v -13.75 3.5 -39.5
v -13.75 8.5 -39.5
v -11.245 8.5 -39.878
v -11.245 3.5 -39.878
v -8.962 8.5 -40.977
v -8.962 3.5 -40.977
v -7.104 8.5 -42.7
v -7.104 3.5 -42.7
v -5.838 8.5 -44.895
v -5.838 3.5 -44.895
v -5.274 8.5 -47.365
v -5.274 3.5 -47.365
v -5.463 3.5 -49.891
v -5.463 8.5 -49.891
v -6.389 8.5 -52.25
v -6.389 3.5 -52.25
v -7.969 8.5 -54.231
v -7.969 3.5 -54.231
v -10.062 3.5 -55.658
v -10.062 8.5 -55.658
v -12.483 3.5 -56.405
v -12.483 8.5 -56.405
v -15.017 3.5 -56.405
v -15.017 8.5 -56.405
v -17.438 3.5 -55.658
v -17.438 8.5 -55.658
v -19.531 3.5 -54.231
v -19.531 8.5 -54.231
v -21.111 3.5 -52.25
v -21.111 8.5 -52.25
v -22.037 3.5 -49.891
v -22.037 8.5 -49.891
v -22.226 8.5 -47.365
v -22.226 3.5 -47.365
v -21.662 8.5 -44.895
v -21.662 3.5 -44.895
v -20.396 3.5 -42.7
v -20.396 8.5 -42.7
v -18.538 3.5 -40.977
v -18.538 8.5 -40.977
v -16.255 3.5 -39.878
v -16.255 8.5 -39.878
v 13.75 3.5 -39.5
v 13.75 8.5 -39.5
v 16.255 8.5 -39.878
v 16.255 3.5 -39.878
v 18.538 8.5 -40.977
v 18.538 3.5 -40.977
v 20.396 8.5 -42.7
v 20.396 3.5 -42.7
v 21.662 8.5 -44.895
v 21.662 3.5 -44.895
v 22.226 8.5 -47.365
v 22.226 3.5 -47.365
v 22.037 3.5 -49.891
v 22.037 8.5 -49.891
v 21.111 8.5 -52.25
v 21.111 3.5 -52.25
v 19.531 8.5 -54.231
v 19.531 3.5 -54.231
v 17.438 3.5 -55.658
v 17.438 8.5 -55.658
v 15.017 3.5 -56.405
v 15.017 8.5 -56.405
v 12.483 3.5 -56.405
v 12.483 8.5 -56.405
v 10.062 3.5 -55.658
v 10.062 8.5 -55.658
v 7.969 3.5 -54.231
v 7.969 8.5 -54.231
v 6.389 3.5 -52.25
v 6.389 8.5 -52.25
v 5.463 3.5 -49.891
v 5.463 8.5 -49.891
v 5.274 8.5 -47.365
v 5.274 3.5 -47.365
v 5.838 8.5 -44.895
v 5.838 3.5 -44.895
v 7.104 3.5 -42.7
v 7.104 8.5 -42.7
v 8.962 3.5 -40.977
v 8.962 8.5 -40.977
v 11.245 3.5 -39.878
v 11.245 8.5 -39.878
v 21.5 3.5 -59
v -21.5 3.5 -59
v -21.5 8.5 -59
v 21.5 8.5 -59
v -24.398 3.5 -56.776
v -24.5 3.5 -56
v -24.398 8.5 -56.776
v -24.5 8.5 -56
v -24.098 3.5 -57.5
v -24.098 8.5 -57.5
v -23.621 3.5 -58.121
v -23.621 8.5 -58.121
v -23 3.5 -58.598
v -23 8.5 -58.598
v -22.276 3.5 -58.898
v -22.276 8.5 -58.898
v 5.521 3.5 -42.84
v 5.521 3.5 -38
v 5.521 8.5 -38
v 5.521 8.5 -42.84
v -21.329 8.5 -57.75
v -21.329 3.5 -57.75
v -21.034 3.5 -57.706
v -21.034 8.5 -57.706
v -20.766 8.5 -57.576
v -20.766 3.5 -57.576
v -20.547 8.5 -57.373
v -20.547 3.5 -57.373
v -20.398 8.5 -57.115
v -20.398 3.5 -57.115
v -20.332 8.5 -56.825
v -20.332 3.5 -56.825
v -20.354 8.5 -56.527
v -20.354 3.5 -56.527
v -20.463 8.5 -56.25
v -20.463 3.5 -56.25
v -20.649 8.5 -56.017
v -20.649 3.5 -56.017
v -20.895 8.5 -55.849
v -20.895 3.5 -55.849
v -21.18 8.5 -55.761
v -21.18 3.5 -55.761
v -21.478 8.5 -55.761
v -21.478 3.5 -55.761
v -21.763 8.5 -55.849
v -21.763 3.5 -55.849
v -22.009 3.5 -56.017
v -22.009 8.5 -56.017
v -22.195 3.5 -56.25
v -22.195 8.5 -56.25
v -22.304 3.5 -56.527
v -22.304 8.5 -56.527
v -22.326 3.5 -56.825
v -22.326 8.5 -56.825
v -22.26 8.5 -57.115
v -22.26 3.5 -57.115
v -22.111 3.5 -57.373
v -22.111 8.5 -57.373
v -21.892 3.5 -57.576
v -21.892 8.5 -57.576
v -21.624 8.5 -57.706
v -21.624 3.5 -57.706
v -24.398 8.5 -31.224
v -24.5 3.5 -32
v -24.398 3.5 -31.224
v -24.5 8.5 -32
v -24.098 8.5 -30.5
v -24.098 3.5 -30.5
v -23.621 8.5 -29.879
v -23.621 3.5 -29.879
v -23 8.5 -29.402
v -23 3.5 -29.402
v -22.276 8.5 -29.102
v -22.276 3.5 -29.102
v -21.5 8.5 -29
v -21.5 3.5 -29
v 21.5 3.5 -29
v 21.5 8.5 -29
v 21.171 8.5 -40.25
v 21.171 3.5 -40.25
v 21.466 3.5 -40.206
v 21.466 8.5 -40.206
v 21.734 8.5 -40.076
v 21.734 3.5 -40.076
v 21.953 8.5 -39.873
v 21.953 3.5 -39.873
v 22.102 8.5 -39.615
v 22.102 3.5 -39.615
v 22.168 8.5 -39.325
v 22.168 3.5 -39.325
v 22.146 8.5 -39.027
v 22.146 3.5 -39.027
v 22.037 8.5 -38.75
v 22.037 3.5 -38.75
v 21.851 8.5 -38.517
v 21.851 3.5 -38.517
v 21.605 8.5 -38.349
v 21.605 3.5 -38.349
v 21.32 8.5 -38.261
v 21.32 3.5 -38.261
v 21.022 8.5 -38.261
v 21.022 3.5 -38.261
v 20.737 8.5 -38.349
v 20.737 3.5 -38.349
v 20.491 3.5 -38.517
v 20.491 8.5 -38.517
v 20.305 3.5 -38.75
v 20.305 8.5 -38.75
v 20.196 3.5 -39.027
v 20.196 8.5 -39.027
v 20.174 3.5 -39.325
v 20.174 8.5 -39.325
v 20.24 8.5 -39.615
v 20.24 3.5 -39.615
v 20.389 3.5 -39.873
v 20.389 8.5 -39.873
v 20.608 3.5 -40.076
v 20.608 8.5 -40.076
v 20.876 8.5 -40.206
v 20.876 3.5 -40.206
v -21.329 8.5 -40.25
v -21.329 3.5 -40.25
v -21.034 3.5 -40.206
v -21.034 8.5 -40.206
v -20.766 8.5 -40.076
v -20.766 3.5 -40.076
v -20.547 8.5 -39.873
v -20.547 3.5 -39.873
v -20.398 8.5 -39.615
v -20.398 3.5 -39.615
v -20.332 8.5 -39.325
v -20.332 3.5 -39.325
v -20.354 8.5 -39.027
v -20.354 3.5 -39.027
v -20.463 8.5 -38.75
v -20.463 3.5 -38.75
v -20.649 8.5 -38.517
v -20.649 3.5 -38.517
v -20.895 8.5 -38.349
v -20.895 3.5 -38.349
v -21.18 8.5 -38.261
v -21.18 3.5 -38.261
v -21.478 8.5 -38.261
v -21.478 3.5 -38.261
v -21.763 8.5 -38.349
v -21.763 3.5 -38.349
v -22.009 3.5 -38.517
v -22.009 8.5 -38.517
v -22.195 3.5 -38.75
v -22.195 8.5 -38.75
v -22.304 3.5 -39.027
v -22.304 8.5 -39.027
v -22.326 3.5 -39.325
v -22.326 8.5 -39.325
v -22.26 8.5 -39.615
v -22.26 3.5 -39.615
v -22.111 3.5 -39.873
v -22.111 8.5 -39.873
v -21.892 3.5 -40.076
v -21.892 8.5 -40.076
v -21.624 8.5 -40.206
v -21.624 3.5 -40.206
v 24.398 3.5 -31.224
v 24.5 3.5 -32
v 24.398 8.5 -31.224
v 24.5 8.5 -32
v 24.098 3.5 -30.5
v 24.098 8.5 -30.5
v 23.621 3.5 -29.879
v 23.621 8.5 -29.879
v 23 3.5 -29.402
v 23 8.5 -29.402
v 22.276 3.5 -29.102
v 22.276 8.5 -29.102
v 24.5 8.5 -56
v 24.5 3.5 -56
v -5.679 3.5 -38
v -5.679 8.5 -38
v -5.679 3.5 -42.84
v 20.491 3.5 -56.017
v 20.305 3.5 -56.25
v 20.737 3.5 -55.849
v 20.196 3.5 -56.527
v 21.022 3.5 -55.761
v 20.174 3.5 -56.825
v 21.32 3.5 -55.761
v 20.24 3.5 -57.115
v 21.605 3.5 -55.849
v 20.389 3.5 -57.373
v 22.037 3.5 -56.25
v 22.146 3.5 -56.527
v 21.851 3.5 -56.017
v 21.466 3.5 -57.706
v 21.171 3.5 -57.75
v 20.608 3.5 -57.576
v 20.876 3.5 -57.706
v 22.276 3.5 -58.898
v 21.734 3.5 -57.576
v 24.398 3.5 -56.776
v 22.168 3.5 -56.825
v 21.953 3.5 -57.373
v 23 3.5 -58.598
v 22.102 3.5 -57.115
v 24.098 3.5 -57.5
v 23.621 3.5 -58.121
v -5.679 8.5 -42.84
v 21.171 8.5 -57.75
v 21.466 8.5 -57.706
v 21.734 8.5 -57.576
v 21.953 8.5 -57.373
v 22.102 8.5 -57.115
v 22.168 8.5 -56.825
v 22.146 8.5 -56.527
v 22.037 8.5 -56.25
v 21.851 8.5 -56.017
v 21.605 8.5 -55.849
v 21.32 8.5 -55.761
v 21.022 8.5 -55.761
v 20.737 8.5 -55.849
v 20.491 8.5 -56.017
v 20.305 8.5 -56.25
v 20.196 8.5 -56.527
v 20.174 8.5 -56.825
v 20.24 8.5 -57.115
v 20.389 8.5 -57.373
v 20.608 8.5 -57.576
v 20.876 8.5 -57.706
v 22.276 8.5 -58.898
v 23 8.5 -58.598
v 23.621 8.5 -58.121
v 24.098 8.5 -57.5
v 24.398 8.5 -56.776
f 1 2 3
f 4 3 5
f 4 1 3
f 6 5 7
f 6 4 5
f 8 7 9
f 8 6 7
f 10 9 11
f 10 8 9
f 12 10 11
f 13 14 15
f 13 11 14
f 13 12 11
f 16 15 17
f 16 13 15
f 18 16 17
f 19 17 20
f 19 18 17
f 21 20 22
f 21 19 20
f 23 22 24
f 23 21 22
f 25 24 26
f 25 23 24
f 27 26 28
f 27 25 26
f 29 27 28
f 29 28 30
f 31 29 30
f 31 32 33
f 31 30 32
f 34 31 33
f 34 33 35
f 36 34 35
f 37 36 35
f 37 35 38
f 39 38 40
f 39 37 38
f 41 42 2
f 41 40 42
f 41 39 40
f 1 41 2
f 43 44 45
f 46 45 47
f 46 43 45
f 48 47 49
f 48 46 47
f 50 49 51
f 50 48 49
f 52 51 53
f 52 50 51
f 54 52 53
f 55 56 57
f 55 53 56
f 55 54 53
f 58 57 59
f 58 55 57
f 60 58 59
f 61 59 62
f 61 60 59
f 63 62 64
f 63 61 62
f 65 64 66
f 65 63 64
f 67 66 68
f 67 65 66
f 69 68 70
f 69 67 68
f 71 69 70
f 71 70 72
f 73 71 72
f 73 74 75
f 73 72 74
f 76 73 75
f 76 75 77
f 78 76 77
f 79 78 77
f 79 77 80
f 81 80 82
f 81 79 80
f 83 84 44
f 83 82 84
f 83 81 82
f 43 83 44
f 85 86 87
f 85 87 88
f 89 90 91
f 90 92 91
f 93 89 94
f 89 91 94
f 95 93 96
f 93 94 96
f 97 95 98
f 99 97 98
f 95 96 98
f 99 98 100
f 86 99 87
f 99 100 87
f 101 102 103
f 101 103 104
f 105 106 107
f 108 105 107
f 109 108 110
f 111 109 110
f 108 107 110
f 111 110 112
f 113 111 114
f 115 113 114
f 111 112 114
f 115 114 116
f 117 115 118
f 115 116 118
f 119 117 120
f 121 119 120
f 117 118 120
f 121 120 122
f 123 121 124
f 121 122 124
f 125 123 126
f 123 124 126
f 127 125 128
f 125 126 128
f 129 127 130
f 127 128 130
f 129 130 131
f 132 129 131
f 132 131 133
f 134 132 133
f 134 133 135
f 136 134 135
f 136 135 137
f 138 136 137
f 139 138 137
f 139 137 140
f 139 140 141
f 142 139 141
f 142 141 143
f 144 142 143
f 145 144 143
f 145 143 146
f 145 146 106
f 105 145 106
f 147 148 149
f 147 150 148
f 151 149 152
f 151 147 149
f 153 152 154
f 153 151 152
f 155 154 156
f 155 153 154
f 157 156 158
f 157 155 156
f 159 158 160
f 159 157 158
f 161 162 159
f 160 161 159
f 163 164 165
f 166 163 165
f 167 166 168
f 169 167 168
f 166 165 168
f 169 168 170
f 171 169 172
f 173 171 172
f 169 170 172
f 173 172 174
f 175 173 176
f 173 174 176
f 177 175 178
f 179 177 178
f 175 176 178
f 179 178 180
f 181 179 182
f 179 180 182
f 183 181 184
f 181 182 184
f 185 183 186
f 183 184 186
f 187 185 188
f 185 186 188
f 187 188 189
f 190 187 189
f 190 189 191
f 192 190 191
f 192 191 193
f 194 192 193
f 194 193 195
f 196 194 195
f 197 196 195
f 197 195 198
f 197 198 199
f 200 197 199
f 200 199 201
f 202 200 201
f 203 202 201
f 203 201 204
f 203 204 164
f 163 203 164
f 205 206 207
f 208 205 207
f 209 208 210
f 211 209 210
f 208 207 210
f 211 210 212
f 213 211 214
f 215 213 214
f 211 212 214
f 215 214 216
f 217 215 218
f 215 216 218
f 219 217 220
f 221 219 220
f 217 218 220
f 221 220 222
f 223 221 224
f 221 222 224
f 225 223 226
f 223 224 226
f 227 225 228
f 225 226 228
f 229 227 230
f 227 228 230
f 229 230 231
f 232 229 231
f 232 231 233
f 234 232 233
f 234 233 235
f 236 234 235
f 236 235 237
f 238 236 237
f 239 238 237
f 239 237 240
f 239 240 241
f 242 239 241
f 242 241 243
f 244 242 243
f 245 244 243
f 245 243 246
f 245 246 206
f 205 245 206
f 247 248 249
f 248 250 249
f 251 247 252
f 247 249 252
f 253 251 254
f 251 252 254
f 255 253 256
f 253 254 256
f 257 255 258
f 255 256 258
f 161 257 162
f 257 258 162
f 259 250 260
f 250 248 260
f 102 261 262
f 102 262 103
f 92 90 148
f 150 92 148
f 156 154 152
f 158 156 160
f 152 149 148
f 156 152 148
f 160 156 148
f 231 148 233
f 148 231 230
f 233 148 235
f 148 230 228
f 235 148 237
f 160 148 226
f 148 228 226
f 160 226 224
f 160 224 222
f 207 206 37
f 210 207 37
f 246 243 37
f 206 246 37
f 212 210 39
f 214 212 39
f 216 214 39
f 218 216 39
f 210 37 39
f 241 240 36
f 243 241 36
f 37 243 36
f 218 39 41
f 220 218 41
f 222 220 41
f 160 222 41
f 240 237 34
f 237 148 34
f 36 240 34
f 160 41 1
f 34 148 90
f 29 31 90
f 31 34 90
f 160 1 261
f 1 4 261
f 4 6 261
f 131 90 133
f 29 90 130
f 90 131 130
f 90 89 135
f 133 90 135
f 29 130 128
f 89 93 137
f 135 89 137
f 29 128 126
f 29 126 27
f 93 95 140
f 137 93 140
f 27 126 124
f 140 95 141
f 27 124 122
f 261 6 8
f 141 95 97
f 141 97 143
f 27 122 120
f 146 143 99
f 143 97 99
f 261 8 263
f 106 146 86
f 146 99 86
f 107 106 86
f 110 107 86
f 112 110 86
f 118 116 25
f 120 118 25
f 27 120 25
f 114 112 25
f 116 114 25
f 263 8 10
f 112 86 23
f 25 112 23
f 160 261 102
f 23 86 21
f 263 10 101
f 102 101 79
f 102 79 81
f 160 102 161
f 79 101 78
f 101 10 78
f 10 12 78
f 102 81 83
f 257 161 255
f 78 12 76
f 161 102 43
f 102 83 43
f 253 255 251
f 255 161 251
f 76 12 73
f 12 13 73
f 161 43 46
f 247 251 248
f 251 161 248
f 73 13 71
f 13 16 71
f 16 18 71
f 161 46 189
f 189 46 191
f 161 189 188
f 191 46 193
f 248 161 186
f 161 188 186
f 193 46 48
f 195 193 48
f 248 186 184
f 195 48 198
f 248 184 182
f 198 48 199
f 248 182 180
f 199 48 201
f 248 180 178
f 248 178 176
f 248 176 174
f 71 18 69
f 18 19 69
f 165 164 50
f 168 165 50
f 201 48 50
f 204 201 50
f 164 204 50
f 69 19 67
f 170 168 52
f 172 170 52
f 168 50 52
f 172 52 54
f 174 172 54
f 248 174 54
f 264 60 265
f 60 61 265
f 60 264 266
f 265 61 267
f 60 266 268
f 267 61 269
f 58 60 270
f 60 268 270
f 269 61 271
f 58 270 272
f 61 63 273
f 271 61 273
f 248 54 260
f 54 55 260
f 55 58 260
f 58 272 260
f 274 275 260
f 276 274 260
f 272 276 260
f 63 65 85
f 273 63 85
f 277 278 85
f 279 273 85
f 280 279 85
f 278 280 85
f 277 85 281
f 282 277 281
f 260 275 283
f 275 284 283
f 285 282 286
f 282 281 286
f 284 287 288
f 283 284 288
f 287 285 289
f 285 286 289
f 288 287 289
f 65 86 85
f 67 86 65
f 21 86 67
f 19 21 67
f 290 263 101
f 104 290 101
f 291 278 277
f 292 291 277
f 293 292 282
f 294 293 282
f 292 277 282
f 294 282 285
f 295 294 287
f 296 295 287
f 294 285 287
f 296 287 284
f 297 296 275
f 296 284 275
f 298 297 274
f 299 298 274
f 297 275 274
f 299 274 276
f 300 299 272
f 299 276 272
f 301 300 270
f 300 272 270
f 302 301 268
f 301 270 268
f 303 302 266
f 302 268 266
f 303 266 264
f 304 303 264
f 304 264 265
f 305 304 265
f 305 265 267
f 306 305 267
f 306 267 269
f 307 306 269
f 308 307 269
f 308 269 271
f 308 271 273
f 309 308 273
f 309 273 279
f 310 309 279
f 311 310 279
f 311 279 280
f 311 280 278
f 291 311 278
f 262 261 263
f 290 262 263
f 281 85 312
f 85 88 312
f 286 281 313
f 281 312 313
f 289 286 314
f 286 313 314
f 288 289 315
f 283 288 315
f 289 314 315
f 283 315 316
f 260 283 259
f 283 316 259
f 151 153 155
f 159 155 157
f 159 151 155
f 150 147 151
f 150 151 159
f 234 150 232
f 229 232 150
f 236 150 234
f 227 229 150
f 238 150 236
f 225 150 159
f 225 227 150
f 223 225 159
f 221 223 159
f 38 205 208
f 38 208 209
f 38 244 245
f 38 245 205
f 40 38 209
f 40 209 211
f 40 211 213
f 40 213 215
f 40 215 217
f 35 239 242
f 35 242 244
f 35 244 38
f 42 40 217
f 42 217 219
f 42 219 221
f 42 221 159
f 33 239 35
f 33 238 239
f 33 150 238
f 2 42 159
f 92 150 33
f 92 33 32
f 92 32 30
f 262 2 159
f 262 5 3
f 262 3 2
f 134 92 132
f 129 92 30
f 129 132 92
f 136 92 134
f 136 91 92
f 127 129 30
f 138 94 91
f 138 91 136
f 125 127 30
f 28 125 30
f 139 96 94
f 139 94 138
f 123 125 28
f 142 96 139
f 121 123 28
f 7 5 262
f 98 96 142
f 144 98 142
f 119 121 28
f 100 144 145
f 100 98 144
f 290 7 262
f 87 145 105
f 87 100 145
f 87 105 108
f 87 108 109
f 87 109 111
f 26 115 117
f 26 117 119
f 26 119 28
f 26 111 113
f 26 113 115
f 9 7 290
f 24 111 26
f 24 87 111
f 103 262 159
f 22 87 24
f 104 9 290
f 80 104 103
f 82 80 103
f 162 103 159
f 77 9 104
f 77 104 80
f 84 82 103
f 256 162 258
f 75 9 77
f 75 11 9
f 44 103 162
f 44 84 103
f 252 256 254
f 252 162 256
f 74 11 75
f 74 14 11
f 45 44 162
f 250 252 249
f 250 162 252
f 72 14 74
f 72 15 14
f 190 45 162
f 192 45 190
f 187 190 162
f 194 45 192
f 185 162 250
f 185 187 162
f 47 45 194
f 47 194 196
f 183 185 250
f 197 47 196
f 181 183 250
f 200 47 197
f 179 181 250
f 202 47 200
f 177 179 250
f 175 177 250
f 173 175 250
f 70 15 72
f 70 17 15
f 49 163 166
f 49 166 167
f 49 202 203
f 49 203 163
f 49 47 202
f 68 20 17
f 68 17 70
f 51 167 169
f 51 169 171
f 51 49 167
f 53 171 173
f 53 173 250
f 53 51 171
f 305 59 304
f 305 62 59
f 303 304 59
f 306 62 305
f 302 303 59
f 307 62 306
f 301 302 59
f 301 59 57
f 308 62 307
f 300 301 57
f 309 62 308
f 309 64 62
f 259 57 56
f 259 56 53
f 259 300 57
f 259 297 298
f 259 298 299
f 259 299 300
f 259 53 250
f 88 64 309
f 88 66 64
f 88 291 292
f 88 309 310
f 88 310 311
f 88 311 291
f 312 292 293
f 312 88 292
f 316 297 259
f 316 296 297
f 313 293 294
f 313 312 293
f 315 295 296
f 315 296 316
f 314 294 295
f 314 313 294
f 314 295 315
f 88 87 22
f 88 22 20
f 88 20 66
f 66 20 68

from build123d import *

# Parameters (mm, degrees)
SKETCH1_R           = 21
SKETCH1_R_2         = 20
BOSS_EXTRUDE1_DEPTH = 3.5
SKETCH2_R           = 3.55
SKETCH2_R_2         = 6.55
SKETCH2_R_3         = 2.55
SKETCH2_R_4         = 8.5
SKETCH2_W           = 11.2
SKETCH2_H           = 4.84
BOSS_EXTRUDE2_DEPTH = 5
SKETCH3_W           = 11.2
SKETCH3_H           = 4.84
SKETCH3_W_2         = 49
SKETCH3_H_2         = 8
SKETCH3_R           = 8.5
IGNORE_DEPTH        = 5
SKETCH4_R           = 8.5
SKETCH4_W           = 11.2
SKETCH4_H           = 4.84
CUT_EXTRUDE2_DEPTH  = 71.901339903
FILLET1_R           = 3
SKETCH5_W           = 42
SKETCH5_H           = 3.5
CUT_EXTRUDE3_DEPTH  = 25
CUT_EXTRUDE5_DEPTH  = 10
FILLET2_R           = 3
SKETCH8_R           = 1
CUT_EXTRUDE6_DEPTH  = 20


with BuildPart() as part:
    # Sketch1 → Boss-Extrude1 (new body)
    with BuildSketch(Plane(origin=(0, 0, 0), x_dir=(1, 0, 0), z_dir=(0, 1, 0))):
        with Locations(Location((0, 0, 0), (0, 0, 90))):
            Circle(SKETCH1_R)
        with Locations(Location((0, 0, 0), (0, 0, 90))):
            Circle(SKETCH1_R_2, mode=Mode.SUBTRACT)
    extrude(amount=BOSS_EXTRUDE1_DEPTH)

    # Sketch2 → Boss-Extrude2 (add)
    with BuildSketch(Plane(origin=(0, 3.5, 0), x_dir=(1, 0, 0), z_dir=(0, 1, 0))):
        Polygon((-29, -5), (-29, -29), (29, -29), (29, -5), (39, -5), (39, 5), (29, 5), (29, 29), (24.5, 29), (24.5, 51), (-24.5, 51), (-24.5, 29), (-29, 29), (-29, 5), (-39, 5), (-39, -5), align=None)
        with Locations(Location((-23.55, -23.55, 0), (0, 0, 270))):
            Circle(SKETCH2_R, mode=Mode.SUBTRACT)
        with Locations(Location((23.55, -23.55, 0), (0, 0, 270))):
            Circle(SKETCH2_R, mode=Mode.SUBTRACT)
        with Locations(Location((0, 0, 0), (0, 0, 270))):
            Circle(SKETCH2_R_2, mode=Mode.SUBTRACT)
        with Locations(Location((-23.55, 23.55, 0), (0, 0, 270))):
            Circle(SKETCH2_R, mode=Mode.SUBTRACT)
        with Locations(Location((23.55, 23.55, 0), (0, 0, 270))):
            Circle(SKETCH2_R, mode=Mode.SUBTRACT)
        with Locations(Location((-34, 0, 0), (0, 0, 270))):
            Circle(SKETCH2_R_3, mode=Mode.SUBTRACT)
        with Locations(Location((34, 0, 0), (0, 0, 270))):
            Circle(SKETCH2_R_3, mode=Mode.SUBTRACT)
        with Locations(Location((13.76, 39, 0), (0, 0, 270))):
            Circle(SKETCH2_R_4, mode=Mode.SUBTRACT)
        with Locations(Location((-13.76, 39, 0), (0, 0, 270))):
            Circle(SKETCH2_R_4, mode=Mode.SUBTRACT)
        with Locations((0, 46.28)):
            Rectangle(SKETCH2_W, SKETCH2_H, mode=Mode.SUBTRACT)
    extrude(amount=BOSS_EXTRUDE2_DEPTH)

    # Sketch3 → Ignore (add)
    with BuildSketch(Plane(origin=(0, 3.5, 0), x_dir=(1, 0, 0), z_dir=(0, 1, 0))):
        with Locations((0, 46.28)):
            Rectangle(SKETCH3_W, SKETCH3_H)
        with Locations((0, 55)):
            Rectangle(SKETCH3_W_2, SKETCH3_H_2)
        with Locations((13.76, 39)):
            Circle(SKETCH3_R)
        with Locations((-13.76, 39)):
            Circle(SKETCH3_R)
    extrude(amount=IGNORE_DEPTH)

    # Sketch4 → Cut-Extrude2 (cut, through all)
    with BuildSketch(Plane(origin=(0, 3.5, 0), x_dir=(1, 0, 0), z_dir=(0, 1, 0))):
        with Locations(Location((-13.75, 48, 0), (0, 0, 270))):
            Circle(SKETCH4_R)
        with Locations(Location((13.75, 48, 0), (0, 0, 270))):
            Circle(SKETCH4_R)
        with Locations((-0.079148889, 40.42)):
            Rectangle(SKETCH4_W, SKETCH4_H)
    extrude(amount=CUT_EXTRUDE2_DEPTH, mode=Mode.SUBTRACT)

    # Fillet1
    fillet1_edges = [part.edges().sort_by_distance(p)[0] for p in [
        (-29, 6, 29),
        (29, 6, 29),
        (39, 6, 5),
        (39, 6, -5),
        (29, 6, -29),
        (-29, 6, -29),
        (-39, 6, -5),
        (-39, 6, 5),
        (24.5, 6, -59),
        (-24.5, 6, -59),
    ]]
    fillet(fillet1_edges, radius=FILLET1_R)

    # Sketch5 → Cut-Extrude3 (cut, symmetric)
    with BuildSketch(Plane.XY):
        with Locations((0, 1.75)):
            Rectangle(SKETCH5_W, SKETCH5_H)
    extrude(amount=CUT_EXTRUDE3_DEPTH, both=True, mode=Mode.SUBTRACT)

    # Sketch6 → Cut-Extrude5 (cut)
    with BuildSketch(Plane(origin=(0, 8.5, 0), x_dir=(1, 0, 0), z_dir=(0, 1, 0))):
        Polygon((-26, 29), (24.5, 29), (43.321910497, 29), (43.321910497, -33.14300085), (-52.072842779, -33.14300085), (-52.072842779, 29), (-38.2971121, 29), align=None)
    extrude(amount=-CUT_EXTRUDE5_DEPTH, mode=Mode.SUBTRACT)

    # Fillet2
    fillet2_edges = [part.edges().sort_by_distance(p)[0] for p in [
        (24.5, 6, -29),
        (-24.5, 6, -29),
    ]]
    fillet(fillet2_edges, radius=FILLET2_R)

    # Sketch8 → Cut-Extrude6 (cut)
    with BuildSketch(Plane.XZ.offset(-3.5)):
        with Locations(Location((-21.329148889, -39.25, 0), (0, 0, 270))):
            Circle(SKETCH8_R)
        with Locations(Location((-21.329148889, -56.75, 0), (0, 0, 270))):
            Circle(SKETCH8_R)
        with Locations(Location((21.170851111, -56.75, 0), (0, 0, 270))):
            Circle(SKETCH8_R)
        with Locations(Location((21.170851111, -39.25, 0), (0, 0, 270))):
            Circle(SKETCH8_R)
    extrude(amount=-CUT_EXTRUDE6_DEPTH, mode=Mode.SUBTRACT)


solid = part.part
